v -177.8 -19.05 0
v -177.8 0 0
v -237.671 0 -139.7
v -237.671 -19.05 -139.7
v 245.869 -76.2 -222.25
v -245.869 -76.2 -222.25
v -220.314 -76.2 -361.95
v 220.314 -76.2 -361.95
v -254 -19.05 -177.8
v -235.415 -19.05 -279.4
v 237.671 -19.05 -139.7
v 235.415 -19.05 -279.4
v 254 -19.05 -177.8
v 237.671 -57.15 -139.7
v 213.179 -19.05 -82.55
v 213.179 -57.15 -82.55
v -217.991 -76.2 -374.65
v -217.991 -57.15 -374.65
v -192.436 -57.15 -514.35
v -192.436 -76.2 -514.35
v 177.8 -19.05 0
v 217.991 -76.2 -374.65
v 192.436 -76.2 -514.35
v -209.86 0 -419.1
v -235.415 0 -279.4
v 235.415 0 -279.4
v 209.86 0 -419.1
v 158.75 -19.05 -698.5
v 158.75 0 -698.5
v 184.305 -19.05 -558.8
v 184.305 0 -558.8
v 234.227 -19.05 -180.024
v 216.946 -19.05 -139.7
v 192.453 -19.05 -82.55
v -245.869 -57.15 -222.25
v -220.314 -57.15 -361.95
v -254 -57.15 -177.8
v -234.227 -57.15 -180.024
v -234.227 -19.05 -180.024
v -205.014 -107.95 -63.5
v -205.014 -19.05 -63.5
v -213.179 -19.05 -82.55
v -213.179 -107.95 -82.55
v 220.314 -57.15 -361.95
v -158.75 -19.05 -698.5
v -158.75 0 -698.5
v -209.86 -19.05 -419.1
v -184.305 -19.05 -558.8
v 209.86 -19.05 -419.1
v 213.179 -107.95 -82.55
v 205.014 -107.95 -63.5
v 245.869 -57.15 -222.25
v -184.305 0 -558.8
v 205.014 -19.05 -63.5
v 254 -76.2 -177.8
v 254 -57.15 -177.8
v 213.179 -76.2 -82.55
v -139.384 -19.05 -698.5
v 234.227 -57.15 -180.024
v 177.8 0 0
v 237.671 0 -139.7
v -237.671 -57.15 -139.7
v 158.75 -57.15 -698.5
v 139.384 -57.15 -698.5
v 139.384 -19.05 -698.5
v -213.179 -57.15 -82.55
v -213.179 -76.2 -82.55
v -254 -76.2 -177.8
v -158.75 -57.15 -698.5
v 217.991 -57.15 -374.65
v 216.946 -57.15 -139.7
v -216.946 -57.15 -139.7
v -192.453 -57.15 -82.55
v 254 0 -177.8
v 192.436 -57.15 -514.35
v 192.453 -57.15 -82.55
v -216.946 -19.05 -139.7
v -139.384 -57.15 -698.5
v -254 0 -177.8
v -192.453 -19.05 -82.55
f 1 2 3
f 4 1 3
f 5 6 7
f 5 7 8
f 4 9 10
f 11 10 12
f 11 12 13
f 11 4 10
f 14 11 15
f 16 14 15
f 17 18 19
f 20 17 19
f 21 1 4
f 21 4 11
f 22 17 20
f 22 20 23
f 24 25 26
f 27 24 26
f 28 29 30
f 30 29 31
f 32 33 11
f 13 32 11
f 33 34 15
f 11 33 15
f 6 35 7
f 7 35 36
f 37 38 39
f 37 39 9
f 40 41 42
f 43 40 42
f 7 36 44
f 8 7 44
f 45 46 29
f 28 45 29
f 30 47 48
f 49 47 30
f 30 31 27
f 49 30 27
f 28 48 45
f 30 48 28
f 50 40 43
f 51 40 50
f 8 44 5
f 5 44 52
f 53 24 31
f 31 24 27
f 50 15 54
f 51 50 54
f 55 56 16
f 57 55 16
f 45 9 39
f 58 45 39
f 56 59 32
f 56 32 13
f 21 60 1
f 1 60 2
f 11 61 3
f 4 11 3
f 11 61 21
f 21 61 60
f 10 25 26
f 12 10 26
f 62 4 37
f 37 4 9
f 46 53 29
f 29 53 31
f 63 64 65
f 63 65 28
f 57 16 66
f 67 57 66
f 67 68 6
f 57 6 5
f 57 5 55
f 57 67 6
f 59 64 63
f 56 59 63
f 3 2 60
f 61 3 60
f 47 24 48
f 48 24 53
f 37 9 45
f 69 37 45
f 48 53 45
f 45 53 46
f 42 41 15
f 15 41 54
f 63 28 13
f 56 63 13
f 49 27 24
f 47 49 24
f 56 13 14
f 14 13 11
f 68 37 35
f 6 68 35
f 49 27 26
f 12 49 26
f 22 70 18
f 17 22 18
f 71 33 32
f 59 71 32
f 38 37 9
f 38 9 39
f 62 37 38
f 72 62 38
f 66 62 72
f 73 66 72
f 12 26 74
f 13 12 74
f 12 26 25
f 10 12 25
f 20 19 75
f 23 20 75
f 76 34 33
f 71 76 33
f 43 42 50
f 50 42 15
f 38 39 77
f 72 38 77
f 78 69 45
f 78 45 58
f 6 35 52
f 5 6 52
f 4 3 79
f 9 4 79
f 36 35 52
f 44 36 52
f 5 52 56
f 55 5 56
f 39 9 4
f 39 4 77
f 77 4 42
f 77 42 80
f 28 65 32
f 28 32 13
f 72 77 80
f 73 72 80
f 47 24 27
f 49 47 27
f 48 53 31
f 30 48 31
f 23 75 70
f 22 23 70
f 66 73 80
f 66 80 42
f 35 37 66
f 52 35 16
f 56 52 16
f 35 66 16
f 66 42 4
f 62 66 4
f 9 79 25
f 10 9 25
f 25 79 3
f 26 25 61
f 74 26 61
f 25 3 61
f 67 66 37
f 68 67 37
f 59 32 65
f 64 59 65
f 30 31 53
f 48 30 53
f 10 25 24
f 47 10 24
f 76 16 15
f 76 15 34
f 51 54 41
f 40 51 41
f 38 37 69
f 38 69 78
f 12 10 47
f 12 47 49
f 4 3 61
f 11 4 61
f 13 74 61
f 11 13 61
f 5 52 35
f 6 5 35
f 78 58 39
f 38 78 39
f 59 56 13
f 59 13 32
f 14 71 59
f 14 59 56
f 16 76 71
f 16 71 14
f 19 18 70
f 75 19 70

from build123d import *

# Parameters (mm, degrees)
F2_DEPTH  = 19.05
F3_DEPTH  = 19.05
F5_DEPTH  = 38.1
F6_DEPTH  = 38.1
F7_DEPTH  = 88.9
F9_DEPTH  = 19.05
F10_DEPTH = 19.05


# Not quite as in the source:
# - a feature names something its author has since deleted; it is built from what else it names


with BuildPart() as f2:
    # F1 (on Front) → F2 (new body)
    with BuildSketch(Plane.XZ):
        Polygon((-209.8597560976, -419.1), (-184.3048780488, -558.8), (184.3048780488, -558.8), (209.8597560976, -419.1), align=None)
    extrude(amount=F2_DEPTH)


with BuildPart() as f2b:
    # F1 (on Front) → F2, piece 2 (new body)
    with BuildSketch(Plane.XZ):
        Polygon((-254, -177.8), (-235.4146341463, -279.4), (235.4146341463, -279.4), (254, -177.8), (237.6714285714, -139.7), (-237.6714285714, -139.7), align=None)
    extrude(amount=F2_DEPTH)


with BuildPart() as f3:
    # F1 (on Front) → F3 (new body)
    with BuildSketch(Plane.XZ):
        Polygon((-184.3048780488, -558.8), (-158.75, -698.5), (158.75, -698.5), (184.3048780488, -558.8), align=None)
    extrude(amount=F3_DEPTH)


with BuildPart() as f3b:
    # F1 (on Front) → F3, piece 2 (new body)
    with BuildSketch(Plane.XZ):
        Polygon((-235.4146341463, -279.4), (-209.8597560976, -419.1), (209.8597560976, -419.1), (235.4146341463, -279.4), align=None)
    extrude(amount=F3_DEPTH)


with BuildPart() as f3c:
    # F1 (on Front) → F3, piece 3 (new body)
    with BuildSketch(Plane.XZ):
        Polygon((-177.8, 0), (-237.6714285714, -139.7), (237.6714285714, -139.7), (177.8, 0), align=None)
    extrude(amount=F3_DEPTH)


with BuildPart() as f5:
    # F4 (on face) → F5 (new body)
    with BuildSketch(Plane.XZ.offset(19.05)):
        Polygon((-213.1785714286, -82.55), (-237.6714285714, -139.7), (-216.9456460476, -139.7), (-192.4527889048, -82.55), align=None)
        Polygon((-237.6714285714, -139.7), (-254, -177.8), (-234.2271538208, -180.0235181374), (-216.9456460476, -139.7), align=None)
    extrude(amount=F5_DEPTH)


with BuildPart() as f5b:
    # F4 (on face) → F5, piece 2 (new body)
    with BuildSketch(Plane.XZ.offset(19.05)):
        Polygon((192.4527889048, -82.55), (216.9456460476, -139.7), (237.6714285714, -139.7), (213.1785714286, -82.55), align=None)
        Polygon((237.6714285714, -139.7), (216.9456460476, -139.7), (234.2271538208, -180.0235181374), (254, -177.8), align=None)
    extrude(amount=F5_DEPTH)


with BuildPart() as f6:
    # F4 (on face) → F6 (new body)
    with BuildSketch(Plane.XZ.offset(19.05)):
        Polygon((-254, -177.8), (-158.75, -698.5), (-139.3838949435, -698.5), (-234.2271538208, -180.0235181374), align=None)
    extrude(amount=F6_DEPTH)


with BuildPart() as f6b:
    # F4 (on face) → F6, piece 2 (new body)
    with BuildSketch(Plane.XZ.offset(19.05)):
        Polygon((254, -177.8), (234.2271538208, -180.0235181374), (139.3838949435, -698.5), (158.75, -698.5), align=None)
    extrude(amount=F6_DEPTH)


with BuildPart() as f7:
    # F4 (on face) → F7 (new body)
    with BuildSketch(Plane.XZ.offset(19.05)):
        Polygon((-205.0142857143, -63.5), (-213.1785714286, -82.55), (-192.4527889048, -82.55), (192.4527889048, -82.55), (213.1785714286, -82.55), (205.0142857143, -63.5), align=None)
    extrude(amount=F7_DEPTH)


with BuildPart() as f9:
    # F8 (on face) → F9 (new body)
    with BuildSketch(Plane.XZ.offset(57.15)):
        Polygon((192.4527889048, -82.55), (-213.1785714286, -82.55), (-254, -177.8), (-245.868902439, -222.25), (245.868902439, -222.25), (254, -177.8), (234.2271538208, -180.0235181374), align=None)
        Polygon((213.1785714286, -82.55), (192.4527889048, -82.55), (234.2271538208, -180.0235181374), (254, -177.8), align=None)
    extrude(amount=F9_DEPTH)


with BuildPart() as f9b:
    # F8 (on face) → F9, piece 2 (new body)
    with BuildSketch(Plane.XZ.offset(57.15)):
        Polygon((217.9908536585, -374.65), (-217.9908536585, -374.65), (-192.4359756098, -514.35), (192.4359756098, -514.35), align=None)
    extrude(amount=F9_DEPTH)


with BuildPart() as f10:
    # F8 (on face) → F10 (new body)
    with BuildSketch(Plane.XZ.offset(57.15)):
        Polygon((245.868902439, -222.25), (-245.868902439, -222.25), (-220.3140243902, -361.95), (220.3140243902, -361.95), align=None)
    extrude(amount=F10_DEPTH)


solid = Compound([f2.part, f2b.part, f3.part, f3b.part, f3c.part, f5.part, f5b.part, f6.part, f6b.part, f7.part, f9.part, f9b.part, f10.part])
